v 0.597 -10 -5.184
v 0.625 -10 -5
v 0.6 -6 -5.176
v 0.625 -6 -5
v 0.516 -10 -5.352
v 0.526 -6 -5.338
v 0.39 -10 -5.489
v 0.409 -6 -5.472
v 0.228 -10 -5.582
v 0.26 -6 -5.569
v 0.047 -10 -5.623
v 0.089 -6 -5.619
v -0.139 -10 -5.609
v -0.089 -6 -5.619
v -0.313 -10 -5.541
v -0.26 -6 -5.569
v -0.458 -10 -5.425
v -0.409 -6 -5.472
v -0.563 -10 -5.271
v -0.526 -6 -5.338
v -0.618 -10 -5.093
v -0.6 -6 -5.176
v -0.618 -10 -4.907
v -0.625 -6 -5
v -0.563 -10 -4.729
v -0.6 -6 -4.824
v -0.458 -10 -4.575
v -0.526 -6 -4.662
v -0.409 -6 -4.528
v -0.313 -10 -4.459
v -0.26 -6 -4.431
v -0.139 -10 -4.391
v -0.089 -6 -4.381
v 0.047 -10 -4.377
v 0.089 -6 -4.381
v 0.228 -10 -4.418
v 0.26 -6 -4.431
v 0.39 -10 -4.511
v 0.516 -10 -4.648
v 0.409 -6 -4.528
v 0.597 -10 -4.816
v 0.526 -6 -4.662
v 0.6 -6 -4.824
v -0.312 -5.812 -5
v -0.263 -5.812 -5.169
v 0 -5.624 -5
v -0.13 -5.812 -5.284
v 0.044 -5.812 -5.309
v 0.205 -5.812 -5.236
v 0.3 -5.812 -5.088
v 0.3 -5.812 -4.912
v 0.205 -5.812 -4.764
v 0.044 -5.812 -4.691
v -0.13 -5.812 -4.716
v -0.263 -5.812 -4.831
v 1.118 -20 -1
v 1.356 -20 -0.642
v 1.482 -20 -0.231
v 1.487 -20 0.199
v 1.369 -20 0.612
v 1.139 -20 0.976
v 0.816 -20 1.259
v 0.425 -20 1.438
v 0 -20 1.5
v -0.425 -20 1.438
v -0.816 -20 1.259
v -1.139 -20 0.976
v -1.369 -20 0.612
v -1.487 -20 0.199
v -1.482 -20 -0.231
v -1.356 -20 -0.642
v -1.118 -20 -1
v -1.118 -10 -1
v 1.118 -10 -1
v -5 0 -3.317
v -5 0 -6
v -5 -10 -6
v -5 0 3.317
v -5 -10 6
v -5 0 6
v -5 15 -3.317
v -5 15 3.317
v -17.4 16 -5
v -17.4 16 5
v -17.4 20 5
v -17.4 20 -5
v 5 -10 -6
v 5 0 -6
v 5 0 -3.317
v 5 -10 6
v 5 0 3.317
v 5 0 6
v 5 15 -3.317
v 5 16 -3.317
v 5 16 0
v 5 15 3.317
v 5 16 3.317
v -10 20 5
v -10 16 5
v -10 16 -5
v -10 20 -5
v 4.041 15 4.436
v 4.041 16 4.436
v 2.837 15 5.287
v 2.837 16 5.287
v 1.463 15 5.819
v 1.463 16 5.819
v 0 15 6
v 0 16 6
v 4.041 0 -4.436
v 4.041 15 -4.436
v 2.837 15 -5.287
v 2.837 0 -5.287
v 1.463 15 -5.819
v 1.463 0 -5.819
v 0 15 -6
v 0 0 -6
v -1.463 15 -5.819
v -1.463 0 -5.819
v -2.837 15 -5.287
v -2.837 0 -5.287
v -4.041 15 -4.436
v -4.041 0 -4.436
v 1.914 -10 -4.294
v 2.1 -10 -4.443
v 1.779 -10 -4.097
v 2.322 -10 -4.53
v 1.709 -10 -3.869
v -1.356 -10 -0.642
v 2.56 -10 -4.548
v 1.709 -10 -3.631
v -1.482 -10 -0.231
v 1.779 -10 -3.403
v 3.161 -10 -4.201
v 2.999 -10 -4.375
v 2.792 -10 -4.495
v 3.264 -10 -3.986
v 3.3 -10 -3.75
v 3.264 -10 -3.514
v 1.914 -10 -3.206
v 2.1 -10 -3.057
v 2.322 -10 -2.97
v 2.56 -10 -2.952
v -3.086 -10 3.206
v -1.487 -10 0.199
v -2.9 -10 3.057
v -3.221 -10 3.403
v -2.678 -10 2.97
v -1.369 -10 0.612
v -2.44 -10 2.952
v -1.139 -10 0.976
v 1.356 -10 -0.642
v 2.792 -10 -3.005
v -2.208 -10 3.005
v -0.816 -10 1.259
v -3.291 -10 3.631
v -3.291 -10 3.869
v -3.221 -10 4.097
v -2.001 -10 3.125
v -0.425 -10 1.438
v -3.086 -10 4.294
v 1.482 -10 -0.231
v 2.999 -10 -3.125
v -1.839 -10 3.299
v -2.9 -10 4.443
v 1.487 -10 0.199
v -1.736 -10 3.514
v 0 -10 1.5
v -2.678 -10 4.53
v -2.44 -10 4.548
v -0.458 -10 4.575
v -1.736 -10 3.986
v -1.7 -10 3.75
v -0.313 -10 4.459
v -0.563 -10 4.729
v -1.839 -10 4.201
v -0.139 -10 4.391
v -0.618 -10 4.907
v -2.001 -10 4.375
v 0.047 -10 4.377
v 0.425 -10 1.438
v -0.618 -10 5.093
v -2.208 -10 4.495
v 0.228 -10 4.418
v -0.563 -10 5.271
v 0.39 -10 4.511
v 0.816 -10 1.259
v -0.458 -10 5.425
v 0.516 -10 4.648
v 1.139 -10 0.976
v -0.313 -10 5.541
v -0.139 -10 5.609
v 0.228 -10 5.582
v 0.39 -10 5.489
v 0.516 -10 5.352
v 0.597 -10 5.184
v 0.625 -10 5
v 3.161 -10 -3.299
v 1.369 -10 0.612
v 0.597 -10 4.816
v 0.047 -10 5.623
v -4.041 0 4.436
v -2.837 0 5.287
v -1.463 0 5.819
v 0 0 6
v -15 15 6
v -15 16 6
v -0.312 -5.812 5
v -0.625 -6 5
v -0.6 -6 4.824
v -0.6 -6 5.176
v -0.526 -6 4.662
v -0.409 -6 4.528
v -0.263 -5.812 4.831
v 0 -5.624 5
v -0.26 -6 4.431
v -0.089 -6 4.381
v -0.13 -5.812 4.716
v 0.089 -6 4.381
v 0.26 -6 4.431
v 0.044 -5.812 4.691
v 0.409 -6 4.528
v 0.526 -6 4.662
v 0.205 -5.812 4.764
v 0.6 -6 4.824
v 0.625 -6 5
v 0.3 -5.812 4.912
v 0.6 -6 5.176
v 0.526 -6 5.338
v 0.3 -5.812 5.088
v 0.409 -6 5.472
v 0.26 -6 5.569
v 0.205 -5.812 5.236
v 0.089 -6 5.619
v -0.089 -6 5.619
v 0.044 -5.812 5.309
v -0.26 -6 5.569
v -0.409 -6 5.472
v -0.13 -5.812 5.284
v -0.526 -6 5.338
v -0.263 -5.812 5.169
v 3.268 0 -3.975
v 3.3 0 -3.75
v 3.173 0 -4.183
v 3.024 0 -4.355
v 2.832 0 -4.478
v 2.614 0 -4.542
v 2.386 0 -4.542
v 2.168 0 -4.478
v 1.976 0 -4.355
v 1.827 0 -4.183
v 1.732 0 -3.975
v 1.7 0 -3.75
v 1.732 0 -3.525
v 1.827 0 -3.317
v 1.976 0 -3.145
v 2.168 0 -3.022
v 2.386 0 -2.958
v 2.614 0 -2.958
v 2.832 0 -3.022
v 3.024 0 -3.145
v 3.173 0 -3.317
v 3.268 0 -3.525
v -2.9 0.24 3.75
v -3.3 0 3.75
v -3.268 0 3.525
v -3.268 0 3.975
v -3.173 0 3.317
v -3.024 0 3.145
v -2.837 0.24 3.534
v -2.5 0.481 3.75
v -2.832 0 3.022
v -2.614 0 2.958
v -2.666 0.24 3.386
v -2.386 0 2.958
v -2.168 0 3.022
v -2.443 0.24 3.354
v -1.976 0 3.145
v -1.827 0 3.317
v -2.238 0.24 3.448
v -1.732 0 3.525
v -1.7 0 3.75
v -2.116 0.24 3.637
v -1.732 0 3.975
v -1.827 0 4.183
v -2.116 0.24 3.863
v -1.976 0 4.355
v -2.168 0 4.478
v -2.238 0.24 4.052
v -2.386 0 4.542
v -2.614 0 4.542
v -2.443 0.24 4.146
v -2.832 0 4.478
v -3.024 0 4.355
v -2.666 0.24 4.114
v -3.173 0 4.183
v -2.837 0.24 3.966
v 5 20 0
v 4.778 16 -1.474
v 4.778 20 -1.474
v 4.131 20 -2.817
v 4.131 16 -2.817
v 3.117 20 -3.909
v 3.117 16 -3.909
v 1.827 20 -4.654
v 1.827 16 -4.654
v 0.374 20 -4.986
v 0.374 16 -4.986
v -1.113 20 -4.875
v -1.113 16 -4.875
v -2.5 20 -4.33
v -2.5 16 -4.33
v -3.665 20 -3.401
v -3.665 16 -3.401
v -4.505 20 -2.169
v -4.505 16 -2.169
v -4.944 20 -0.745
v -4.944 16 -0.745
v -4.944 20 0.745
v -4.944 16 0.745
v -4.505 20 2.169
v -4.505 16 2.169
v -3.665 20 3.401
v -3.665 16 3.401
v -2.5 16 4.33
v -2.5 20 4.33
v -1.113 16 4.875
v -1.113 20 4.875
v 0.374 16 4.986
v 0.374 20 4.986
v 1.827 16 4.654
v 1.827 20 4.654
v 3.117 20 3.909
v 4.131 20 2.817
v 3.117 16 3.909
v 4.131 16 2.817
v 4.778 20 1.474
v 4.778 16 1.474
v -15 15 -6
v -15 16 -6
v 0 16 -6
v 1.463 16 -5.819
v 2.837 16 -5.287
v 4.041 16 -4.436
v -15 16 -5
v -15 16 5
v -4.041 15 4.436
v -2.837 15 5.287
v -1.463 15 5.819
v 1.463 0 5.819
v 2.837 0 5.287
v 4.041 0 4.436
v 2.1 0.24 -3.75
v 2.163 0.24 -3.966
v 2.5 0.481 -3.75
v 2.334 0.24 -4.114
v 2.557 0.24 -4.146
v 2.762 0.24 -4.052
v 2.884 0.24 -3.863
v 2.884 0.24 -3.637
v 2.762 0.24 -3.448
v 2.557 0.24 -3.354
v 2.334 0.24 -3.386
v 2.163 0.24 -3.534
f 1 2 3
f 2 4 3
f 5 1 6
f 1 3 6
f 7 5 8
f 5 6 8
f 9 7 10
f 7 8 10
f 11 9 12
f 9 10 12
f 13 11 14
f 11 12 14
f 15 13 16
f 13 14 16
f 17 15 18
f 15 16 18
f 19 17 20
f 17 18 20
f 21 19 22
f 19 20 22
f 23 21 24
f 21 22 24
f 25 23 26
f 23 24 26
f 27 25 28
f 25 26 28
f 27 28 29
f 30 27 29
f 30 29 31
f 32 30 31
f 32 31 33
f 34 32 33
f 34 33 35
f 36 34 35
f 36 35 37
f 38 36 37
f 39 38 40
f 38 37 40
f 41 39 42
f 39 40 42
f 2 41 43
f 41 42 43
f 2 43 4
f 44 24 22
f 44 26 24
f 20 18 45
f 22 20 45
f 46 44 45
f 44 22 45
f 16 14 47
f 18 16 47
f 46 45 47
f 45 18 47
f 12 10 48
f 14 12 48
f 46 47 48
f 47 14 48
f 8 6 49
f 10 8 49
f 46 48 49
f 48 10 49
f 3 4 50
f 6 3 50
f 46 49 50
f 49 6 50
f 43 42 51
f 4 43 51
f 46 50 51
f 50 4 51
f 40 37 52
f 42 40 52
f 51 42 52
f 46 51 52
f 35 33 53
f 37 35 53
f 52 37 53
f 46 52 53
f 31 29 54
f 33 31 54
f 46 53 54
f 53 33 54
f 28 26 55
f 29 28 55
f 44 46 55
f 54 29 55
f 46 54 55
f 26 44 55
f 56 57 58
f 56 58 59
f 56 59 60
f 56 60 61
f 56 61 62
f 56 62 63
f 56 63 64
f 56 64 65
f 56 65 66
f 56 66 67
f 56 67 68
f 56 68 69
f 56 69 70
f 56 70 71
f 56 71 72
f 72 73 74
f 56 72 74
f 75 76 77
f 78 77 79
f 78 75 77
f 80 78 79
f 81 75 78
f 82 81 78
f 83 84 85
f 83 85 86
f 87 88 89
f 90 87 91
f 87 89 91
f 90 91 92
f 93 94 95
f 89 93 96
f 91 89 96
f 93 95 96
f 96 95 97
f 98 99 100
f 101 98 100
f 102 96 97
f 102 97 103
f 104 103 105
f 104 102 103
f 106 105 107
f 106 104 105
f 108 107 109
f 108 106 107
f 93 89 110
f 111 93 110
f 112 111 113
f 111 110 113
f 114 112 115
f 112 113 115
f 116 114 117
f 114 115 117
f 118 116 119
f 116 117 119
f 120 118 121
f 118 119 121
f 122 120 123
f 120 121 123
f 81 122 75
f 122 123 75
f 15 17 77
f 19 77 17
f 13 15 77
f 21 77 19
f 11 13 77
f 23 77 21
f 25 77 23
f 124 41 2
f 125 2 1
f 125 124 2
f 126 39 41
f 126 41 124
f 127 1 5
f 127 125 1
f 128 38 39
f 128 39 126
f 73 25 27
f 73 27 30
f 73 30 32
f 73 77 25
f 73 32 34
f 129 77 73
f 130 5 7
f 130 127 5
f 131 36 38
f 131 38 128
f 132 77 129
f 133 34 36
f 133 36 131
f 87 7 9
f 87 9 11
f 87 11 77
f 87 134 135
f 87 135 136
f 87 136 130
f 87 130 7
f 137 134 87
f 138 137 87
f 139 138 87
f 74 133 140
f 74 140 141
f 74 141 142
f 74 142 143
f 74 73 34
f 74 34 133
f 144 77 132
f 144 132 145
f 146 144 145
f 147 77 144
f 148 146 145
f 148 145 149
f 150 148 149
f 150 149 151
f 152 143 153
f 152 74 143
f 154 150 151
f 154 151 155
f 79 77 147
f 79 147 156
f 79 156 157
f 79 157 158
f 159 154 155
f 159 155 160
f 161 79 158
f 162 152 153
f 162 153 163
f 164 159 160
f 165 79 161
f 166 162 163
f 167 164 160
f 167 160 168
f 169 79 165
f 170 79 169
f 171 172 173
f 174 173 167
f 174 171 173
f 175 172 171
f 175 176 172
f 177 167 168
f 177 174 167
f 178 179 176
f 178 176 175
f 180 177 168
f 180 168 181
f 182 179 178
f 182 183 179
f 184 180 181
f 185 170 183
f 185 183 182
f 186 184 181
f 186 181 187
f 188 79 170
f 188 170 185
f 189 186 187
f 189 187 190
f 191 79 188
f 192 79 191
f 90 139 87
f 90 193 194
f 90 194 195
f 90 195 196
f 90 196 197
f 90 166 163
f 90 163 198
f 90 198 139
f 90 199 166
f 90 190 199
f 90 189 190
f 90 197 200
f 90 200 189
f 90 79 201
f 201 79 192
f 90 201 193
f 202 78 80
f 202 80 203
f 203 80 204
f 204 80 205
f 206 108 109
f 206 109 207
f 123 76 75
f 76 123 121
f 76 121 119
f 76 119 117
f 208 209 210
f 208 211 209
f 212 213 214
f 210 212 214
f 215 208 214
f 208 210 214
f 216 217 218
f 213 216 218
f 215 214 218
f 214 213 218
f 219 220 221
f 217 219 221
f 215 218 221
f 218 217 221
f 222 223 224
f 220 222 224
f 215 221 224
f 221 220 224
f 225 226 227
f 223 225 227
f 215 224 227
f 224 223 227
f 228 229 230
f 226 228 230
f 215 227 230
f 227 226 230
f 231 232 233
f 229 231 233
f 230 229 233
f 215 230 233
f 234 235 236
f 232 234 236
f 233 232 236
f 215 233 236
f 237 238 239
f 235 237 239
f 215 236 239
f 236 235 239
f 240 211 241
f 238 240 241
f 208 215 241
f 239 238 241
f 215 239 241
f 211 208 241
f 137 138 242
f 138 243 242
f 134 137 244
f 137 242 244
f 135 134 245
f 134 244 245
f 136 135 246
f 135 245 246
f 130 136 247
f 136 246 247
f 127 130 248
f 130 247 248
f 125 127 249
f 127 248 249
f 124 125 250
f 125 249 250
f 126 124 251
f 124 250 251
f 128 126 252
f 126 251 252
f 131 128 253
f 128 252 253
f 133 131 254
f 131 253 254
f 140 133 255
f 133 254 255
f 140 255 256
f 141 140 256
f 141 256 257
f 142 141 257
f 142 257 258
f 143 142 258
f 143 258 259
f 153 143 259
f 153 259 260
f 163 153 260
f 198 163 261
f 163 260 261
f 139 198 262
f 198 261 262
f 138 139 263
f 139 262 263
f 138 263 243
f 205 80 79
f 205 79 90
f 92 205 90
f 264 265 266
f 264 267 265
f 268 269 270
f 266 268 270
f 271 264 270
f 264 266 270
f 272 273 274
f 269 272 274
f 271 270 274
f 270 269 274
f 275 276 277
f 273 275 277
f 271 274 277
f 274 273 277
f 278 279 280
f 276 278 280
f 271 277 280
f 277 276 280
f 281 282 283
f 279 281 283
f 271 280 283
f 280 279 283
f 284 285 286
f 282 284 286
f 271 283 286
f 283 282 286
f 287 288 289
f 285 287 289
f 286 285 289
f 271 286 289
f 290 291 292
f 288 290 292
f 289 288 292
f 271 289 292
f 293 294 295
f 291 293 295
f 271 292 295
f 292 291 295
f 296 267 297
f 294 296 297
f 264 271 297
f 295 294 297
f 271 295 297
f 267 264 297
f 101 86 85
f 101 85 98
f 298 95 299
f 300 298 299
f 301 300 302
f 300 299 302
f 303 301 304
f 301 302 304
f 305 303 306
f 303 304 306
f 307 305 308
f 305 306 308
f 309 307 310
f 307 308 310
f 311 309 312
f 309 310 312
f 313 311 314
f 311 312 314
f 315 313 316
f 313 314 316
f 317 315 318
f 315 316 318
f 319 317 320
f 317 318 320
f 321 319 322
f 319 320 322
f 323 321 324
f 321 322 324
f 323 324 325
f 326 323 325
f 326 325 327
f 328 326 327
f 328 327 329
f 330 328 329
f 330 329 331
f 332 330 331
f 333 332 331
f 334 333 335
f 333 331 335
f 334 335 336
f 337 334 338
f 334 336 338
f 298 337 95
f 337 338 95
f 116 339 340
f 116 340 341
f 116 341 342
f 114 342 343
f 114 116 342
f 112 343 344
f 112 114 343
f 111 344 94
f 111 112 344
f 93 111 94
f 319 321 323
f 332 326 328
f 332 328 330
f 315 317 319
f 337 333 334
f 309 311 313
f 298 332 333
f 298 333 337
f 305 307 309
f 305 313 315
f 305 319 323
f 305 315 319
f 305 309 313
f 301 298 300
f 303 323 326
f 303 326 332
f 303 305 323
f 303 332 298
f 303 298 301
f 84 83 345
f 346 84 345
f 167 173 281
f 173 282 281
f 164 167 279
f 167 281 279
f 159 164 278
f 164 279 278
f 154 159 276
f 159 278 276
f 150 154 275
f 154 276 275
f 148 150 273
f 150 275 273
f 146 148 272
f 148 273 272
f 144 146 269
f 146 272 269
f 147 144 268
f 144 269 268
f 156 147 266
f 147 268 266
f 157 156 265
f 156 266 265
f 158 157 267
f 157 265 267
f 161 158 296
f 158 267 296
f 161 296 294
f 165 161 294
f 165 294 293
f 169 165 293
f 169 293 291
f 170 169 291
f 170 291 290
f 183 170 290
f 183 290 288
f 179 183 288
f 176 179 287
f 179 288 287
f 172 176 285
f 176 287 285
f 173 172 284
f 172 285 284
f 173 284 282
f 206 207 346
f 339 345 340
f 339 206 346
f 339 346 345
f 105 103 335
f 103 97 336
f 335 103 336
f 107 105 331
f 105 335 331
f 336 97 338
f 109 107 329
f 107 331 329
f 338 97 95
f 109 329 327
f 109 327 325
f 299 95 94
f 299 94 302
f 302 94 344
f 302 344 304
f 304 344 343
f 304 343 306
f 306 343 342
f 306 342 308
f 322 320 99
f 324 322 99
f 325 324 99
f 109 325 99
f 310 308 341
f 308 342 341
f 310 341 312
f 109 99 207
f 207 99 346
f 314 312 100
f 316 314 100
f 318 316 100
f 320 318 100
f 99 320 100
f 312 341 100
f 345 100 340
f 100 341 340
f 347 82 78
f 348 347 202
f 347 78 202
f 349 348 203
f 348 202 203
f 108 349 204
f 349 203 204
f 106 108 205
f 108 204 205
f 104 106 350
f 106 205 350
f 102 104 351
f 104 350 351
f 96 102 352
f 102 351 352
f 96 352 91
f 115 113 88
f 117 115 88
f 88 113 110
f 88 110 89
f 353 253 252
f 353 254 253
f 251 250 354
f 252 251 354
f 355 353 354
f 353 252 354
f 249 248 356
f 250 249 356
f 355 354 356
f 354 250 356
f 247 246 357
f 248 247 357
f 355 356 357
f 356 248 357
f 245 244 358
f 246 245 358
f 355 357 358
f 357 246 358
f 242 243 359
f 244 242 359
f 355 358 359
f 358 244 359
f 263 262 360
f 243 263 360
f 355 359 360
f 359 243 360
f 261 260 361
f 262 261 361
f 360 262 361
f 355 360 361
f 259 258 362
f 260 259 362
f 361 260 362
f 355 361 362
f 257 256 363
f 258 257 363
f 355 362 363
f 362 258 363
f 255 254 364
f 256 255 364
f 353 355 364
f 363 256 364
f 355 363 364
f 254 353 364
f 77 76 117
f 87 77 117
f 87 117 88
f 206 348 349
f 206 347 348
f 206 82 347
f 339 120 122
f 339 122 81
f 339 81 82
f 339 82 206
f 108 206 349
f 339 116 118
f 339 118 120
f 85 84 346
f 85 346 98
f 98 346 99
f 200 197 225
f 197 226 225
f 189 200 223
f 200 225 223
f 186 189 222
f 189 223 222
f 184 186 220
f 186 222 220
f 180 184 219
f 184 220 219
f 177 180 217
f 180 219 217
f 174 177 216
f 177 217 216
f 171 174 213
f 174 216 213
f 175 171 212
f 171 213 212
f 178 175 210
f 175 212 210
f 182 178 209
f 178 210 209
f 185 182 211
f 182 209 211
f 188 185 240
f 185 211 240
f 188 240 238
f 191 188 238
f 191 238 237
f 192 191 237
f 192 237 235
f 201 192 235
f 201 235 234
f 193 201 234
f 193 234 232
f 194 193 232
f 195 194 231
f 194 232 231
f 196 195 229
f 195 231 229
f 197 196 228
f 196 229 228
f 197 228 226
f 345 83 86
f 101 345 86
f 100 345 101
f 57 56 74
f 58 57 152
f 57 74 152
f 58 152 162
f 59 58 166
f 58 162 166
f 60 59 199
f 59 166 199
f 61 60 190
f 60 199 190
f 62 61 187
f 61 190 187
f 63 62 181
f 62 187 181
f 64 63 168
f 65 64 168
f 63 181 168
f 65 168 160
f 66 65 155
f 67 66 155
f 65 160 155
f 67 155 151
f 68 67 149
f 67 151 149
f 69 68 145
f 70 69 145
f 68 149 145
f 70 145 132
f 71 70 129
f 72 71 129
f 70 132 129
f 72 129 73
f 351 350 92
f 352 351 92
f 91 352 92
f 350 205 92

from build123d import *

# Parameters (mm, degrees)
SKETCH_1_R               = 6
EXTRUDE_1_DEPTH          = 15
SKETCH_2_OUTSIDE_W       = 18.53
SKETCH_2_OUTSIDE_H       = 18.53
SKETCH_2_OUTSIDE_W_2     = 10
SKETCH_2_OUTSIDE_H_2     = 17.562426414
CUT_EXTRUDE_1_DEPTH      = 15
EXTRUDE_2_DEPTH          = 1
SKETCH_4_W               = 10
SKETCH_4_H               = 12
EXTRUDE_3_DEPTH          = 10
SKETCH_5_R               = 1.5
EXTRUDE_4_DEPTH          = 10
SKETCH_6_W               = 6.926984356
SKETCH_6_H               = 2.009610912
CUT_EXTRUDE_2_DEPTH      = 10
SKETCH_7_R               = 5
EXTRUDE_5_DEPTH          = 4
SKETCH_8_W               = 7.4
SKETCH_8_H               = 10
EXTRUDE_6_DEPTH          = 4
HOLE_WIZARD_M1_4_1_D     = 1.6
HOLE_WIZARD_M1_4_1_DEPTH = 10
HOLE_WIZARD_M1_4_1_TIP   = 0.480688495
HOLE_WIZARD_M1_6_1_D     = 1.25
HOLE_WIZARD_M1_6_1_DEPTH = 4
HOLE_WIZARD_M1_6_1_TIP   = 0.375537887


with BuildPart() as part:
    # 草图1 → 凸台-拉伸1 (new body)
    with BuildSketch(Plane(origin=(0, 0, 0), x_dir=(1, 0, 0), z_dir=(0, 1, 0))):
        with Locations(Location((0, 0, 0), (0, 0, 270))):
            Circle(SKETCH_1_R)
    extrude(amount=EXTRUDE_1_DEPTH)

    # 草图2 outside → 切除-拉伸1 (cut)
    with BuildSketch(Plane(origin=(0, 15, 0), x_dir=(1, 0, 0), z_dir=(0, 1, 0))):
        Rectangle(SKETCH_2_OUTSIDE_W, SKETCH_2_OUTSIDE_H)
        Rectangle(SKETCH_2_OUTSIDE_W_2, SKETCH_2_OUTSIDE_H_2, mode=Mode.SUBTRACT)
    extrude(amount=-CUT_EXTRUDE_1_DEPTH, mode=Mode.SUBTRACT)

    # 草图3 → 凸台-拉伸2 (add)
    with BuildSketch(Plane(origin=(0, 15, 0), x_dir=(1, 0, 0), z_dir=(0, 1, 0))):
        with BuildLine():
            Line((0, -6), (-15, -6))
            Line((-15, -6), (-15, 6))
            Line((-15, 6), (0, 6))
            ThreePointArc((0, 6), (2.837274331, 5.286764074), (5, 3.31662479))
            Line((5, 3.31662479), (5, -3.31662479))
            ThreePointArc((5, -3.31662479), (2.837274331, -5.286764074), (0, -6))
        make_face()
    extrude(amount=EXTRUDE_2_DEPTH)

    # 草图4 → 凸台-拉伸3 (add)
    with BuildSketch(Plane.XZ):
        Rectangle(SKETCH_4_W, SKETCH_4_H)
    extrude(amount=EXTRUDE_3_DEPTH)

    # 草图5 → 凸台-拉伸4 (add)
    with BuildSketch(Plane.XZ.offset(10)):
        with Locations(Location((0, 0, 0), (0, 0, 270))):
            Circle(SKETCH_5_R)
    extrude(amount=EXTRUDE_4_DEPTH)

    # 草图6 → 切除-拉伸2 (cut)
    with BuildSketch(Plane.XZ.offset(20)):
        with Locations((0.466792476, -2.004805456)):
            Rectangle(SKETCH_6_W, SKETCH_6_H)
    extrude(amount=-CUT_EXTRUDE_2_DEPTH, mode=Mode.SUBTRACT)

    # 草图7 → 凸台-拉伸5 (add)
    with BuildSketch(Plane(origin=(0, 16, 0), x_dir=(1, 0, 0), z_dir=(0, 1, 0))):
        Circle(SKETCH_7_R)
    extrude(amount=EXTRUDE_5_DEPTH)

    # 草图8 → 凸台-拉伸6 (add)
    with BuildSketch(Plane(origin=(0, 16, 0), x_dir=(1, 0, 0), z_dir=(0, 1, 0))):
        with Locations((-13.7, 0)):
            Rectangle(SKETCH_8_W, SKETCH_8_H)
    extrude(amount=EXTRUDE_6_DEPTH)

    # M1.4 间隙孔1
    with Locations(Plane(origin=(0, -10, 0), x_dir=(-1, 0, 0), z_dir=(0, -1, 0))):
        with Locations((-2.5, 3.75), (2.5, -3.75)):
            Hole(HOLE_WIZARD_M1_4_1_D / 2, depth=HOLE_WIZARD_M1_4_1_DEPTH)
            with Locations((0, 0, -(HOLE_WIZARD_M1_4_1_DEPTH + HOLE_WIZARD_M1_4_1_TIP / 2))):  # 118° drill point
                Cone(0, HOLE_WIZARD_M1_4_1_D / 2, HOLE_WIZARD_M1_4_1_TIP, mode=Mode.SUBTRACT)

    # M1.6 螺纹孔1
    with Locations(Plane(origin=(0, -10, 0), x_dir=(-1, 0, 0), z_dir=(0, -1, 0))):
        with Locations((0, 5), (0, -5)):
            Hole(HOLE_WIZARD_M1_6_1_D / 2, depth=HOLE_WIZARD_M1_6_1_DEPTH)
            with Locations((0, 0, -(HOLE_WIZARD_M1_6_1_DEPTH + HOLE_WIZARD_M1_6_1_TIP / 2))):  # 118° drill point
                Cone(0, HOLE_WIZARD_M1_6_1_D / 2, HOLE_WIZARD_M1_6_1_TIP, mode=Mode.SUBTRACT)


solid = part.part
